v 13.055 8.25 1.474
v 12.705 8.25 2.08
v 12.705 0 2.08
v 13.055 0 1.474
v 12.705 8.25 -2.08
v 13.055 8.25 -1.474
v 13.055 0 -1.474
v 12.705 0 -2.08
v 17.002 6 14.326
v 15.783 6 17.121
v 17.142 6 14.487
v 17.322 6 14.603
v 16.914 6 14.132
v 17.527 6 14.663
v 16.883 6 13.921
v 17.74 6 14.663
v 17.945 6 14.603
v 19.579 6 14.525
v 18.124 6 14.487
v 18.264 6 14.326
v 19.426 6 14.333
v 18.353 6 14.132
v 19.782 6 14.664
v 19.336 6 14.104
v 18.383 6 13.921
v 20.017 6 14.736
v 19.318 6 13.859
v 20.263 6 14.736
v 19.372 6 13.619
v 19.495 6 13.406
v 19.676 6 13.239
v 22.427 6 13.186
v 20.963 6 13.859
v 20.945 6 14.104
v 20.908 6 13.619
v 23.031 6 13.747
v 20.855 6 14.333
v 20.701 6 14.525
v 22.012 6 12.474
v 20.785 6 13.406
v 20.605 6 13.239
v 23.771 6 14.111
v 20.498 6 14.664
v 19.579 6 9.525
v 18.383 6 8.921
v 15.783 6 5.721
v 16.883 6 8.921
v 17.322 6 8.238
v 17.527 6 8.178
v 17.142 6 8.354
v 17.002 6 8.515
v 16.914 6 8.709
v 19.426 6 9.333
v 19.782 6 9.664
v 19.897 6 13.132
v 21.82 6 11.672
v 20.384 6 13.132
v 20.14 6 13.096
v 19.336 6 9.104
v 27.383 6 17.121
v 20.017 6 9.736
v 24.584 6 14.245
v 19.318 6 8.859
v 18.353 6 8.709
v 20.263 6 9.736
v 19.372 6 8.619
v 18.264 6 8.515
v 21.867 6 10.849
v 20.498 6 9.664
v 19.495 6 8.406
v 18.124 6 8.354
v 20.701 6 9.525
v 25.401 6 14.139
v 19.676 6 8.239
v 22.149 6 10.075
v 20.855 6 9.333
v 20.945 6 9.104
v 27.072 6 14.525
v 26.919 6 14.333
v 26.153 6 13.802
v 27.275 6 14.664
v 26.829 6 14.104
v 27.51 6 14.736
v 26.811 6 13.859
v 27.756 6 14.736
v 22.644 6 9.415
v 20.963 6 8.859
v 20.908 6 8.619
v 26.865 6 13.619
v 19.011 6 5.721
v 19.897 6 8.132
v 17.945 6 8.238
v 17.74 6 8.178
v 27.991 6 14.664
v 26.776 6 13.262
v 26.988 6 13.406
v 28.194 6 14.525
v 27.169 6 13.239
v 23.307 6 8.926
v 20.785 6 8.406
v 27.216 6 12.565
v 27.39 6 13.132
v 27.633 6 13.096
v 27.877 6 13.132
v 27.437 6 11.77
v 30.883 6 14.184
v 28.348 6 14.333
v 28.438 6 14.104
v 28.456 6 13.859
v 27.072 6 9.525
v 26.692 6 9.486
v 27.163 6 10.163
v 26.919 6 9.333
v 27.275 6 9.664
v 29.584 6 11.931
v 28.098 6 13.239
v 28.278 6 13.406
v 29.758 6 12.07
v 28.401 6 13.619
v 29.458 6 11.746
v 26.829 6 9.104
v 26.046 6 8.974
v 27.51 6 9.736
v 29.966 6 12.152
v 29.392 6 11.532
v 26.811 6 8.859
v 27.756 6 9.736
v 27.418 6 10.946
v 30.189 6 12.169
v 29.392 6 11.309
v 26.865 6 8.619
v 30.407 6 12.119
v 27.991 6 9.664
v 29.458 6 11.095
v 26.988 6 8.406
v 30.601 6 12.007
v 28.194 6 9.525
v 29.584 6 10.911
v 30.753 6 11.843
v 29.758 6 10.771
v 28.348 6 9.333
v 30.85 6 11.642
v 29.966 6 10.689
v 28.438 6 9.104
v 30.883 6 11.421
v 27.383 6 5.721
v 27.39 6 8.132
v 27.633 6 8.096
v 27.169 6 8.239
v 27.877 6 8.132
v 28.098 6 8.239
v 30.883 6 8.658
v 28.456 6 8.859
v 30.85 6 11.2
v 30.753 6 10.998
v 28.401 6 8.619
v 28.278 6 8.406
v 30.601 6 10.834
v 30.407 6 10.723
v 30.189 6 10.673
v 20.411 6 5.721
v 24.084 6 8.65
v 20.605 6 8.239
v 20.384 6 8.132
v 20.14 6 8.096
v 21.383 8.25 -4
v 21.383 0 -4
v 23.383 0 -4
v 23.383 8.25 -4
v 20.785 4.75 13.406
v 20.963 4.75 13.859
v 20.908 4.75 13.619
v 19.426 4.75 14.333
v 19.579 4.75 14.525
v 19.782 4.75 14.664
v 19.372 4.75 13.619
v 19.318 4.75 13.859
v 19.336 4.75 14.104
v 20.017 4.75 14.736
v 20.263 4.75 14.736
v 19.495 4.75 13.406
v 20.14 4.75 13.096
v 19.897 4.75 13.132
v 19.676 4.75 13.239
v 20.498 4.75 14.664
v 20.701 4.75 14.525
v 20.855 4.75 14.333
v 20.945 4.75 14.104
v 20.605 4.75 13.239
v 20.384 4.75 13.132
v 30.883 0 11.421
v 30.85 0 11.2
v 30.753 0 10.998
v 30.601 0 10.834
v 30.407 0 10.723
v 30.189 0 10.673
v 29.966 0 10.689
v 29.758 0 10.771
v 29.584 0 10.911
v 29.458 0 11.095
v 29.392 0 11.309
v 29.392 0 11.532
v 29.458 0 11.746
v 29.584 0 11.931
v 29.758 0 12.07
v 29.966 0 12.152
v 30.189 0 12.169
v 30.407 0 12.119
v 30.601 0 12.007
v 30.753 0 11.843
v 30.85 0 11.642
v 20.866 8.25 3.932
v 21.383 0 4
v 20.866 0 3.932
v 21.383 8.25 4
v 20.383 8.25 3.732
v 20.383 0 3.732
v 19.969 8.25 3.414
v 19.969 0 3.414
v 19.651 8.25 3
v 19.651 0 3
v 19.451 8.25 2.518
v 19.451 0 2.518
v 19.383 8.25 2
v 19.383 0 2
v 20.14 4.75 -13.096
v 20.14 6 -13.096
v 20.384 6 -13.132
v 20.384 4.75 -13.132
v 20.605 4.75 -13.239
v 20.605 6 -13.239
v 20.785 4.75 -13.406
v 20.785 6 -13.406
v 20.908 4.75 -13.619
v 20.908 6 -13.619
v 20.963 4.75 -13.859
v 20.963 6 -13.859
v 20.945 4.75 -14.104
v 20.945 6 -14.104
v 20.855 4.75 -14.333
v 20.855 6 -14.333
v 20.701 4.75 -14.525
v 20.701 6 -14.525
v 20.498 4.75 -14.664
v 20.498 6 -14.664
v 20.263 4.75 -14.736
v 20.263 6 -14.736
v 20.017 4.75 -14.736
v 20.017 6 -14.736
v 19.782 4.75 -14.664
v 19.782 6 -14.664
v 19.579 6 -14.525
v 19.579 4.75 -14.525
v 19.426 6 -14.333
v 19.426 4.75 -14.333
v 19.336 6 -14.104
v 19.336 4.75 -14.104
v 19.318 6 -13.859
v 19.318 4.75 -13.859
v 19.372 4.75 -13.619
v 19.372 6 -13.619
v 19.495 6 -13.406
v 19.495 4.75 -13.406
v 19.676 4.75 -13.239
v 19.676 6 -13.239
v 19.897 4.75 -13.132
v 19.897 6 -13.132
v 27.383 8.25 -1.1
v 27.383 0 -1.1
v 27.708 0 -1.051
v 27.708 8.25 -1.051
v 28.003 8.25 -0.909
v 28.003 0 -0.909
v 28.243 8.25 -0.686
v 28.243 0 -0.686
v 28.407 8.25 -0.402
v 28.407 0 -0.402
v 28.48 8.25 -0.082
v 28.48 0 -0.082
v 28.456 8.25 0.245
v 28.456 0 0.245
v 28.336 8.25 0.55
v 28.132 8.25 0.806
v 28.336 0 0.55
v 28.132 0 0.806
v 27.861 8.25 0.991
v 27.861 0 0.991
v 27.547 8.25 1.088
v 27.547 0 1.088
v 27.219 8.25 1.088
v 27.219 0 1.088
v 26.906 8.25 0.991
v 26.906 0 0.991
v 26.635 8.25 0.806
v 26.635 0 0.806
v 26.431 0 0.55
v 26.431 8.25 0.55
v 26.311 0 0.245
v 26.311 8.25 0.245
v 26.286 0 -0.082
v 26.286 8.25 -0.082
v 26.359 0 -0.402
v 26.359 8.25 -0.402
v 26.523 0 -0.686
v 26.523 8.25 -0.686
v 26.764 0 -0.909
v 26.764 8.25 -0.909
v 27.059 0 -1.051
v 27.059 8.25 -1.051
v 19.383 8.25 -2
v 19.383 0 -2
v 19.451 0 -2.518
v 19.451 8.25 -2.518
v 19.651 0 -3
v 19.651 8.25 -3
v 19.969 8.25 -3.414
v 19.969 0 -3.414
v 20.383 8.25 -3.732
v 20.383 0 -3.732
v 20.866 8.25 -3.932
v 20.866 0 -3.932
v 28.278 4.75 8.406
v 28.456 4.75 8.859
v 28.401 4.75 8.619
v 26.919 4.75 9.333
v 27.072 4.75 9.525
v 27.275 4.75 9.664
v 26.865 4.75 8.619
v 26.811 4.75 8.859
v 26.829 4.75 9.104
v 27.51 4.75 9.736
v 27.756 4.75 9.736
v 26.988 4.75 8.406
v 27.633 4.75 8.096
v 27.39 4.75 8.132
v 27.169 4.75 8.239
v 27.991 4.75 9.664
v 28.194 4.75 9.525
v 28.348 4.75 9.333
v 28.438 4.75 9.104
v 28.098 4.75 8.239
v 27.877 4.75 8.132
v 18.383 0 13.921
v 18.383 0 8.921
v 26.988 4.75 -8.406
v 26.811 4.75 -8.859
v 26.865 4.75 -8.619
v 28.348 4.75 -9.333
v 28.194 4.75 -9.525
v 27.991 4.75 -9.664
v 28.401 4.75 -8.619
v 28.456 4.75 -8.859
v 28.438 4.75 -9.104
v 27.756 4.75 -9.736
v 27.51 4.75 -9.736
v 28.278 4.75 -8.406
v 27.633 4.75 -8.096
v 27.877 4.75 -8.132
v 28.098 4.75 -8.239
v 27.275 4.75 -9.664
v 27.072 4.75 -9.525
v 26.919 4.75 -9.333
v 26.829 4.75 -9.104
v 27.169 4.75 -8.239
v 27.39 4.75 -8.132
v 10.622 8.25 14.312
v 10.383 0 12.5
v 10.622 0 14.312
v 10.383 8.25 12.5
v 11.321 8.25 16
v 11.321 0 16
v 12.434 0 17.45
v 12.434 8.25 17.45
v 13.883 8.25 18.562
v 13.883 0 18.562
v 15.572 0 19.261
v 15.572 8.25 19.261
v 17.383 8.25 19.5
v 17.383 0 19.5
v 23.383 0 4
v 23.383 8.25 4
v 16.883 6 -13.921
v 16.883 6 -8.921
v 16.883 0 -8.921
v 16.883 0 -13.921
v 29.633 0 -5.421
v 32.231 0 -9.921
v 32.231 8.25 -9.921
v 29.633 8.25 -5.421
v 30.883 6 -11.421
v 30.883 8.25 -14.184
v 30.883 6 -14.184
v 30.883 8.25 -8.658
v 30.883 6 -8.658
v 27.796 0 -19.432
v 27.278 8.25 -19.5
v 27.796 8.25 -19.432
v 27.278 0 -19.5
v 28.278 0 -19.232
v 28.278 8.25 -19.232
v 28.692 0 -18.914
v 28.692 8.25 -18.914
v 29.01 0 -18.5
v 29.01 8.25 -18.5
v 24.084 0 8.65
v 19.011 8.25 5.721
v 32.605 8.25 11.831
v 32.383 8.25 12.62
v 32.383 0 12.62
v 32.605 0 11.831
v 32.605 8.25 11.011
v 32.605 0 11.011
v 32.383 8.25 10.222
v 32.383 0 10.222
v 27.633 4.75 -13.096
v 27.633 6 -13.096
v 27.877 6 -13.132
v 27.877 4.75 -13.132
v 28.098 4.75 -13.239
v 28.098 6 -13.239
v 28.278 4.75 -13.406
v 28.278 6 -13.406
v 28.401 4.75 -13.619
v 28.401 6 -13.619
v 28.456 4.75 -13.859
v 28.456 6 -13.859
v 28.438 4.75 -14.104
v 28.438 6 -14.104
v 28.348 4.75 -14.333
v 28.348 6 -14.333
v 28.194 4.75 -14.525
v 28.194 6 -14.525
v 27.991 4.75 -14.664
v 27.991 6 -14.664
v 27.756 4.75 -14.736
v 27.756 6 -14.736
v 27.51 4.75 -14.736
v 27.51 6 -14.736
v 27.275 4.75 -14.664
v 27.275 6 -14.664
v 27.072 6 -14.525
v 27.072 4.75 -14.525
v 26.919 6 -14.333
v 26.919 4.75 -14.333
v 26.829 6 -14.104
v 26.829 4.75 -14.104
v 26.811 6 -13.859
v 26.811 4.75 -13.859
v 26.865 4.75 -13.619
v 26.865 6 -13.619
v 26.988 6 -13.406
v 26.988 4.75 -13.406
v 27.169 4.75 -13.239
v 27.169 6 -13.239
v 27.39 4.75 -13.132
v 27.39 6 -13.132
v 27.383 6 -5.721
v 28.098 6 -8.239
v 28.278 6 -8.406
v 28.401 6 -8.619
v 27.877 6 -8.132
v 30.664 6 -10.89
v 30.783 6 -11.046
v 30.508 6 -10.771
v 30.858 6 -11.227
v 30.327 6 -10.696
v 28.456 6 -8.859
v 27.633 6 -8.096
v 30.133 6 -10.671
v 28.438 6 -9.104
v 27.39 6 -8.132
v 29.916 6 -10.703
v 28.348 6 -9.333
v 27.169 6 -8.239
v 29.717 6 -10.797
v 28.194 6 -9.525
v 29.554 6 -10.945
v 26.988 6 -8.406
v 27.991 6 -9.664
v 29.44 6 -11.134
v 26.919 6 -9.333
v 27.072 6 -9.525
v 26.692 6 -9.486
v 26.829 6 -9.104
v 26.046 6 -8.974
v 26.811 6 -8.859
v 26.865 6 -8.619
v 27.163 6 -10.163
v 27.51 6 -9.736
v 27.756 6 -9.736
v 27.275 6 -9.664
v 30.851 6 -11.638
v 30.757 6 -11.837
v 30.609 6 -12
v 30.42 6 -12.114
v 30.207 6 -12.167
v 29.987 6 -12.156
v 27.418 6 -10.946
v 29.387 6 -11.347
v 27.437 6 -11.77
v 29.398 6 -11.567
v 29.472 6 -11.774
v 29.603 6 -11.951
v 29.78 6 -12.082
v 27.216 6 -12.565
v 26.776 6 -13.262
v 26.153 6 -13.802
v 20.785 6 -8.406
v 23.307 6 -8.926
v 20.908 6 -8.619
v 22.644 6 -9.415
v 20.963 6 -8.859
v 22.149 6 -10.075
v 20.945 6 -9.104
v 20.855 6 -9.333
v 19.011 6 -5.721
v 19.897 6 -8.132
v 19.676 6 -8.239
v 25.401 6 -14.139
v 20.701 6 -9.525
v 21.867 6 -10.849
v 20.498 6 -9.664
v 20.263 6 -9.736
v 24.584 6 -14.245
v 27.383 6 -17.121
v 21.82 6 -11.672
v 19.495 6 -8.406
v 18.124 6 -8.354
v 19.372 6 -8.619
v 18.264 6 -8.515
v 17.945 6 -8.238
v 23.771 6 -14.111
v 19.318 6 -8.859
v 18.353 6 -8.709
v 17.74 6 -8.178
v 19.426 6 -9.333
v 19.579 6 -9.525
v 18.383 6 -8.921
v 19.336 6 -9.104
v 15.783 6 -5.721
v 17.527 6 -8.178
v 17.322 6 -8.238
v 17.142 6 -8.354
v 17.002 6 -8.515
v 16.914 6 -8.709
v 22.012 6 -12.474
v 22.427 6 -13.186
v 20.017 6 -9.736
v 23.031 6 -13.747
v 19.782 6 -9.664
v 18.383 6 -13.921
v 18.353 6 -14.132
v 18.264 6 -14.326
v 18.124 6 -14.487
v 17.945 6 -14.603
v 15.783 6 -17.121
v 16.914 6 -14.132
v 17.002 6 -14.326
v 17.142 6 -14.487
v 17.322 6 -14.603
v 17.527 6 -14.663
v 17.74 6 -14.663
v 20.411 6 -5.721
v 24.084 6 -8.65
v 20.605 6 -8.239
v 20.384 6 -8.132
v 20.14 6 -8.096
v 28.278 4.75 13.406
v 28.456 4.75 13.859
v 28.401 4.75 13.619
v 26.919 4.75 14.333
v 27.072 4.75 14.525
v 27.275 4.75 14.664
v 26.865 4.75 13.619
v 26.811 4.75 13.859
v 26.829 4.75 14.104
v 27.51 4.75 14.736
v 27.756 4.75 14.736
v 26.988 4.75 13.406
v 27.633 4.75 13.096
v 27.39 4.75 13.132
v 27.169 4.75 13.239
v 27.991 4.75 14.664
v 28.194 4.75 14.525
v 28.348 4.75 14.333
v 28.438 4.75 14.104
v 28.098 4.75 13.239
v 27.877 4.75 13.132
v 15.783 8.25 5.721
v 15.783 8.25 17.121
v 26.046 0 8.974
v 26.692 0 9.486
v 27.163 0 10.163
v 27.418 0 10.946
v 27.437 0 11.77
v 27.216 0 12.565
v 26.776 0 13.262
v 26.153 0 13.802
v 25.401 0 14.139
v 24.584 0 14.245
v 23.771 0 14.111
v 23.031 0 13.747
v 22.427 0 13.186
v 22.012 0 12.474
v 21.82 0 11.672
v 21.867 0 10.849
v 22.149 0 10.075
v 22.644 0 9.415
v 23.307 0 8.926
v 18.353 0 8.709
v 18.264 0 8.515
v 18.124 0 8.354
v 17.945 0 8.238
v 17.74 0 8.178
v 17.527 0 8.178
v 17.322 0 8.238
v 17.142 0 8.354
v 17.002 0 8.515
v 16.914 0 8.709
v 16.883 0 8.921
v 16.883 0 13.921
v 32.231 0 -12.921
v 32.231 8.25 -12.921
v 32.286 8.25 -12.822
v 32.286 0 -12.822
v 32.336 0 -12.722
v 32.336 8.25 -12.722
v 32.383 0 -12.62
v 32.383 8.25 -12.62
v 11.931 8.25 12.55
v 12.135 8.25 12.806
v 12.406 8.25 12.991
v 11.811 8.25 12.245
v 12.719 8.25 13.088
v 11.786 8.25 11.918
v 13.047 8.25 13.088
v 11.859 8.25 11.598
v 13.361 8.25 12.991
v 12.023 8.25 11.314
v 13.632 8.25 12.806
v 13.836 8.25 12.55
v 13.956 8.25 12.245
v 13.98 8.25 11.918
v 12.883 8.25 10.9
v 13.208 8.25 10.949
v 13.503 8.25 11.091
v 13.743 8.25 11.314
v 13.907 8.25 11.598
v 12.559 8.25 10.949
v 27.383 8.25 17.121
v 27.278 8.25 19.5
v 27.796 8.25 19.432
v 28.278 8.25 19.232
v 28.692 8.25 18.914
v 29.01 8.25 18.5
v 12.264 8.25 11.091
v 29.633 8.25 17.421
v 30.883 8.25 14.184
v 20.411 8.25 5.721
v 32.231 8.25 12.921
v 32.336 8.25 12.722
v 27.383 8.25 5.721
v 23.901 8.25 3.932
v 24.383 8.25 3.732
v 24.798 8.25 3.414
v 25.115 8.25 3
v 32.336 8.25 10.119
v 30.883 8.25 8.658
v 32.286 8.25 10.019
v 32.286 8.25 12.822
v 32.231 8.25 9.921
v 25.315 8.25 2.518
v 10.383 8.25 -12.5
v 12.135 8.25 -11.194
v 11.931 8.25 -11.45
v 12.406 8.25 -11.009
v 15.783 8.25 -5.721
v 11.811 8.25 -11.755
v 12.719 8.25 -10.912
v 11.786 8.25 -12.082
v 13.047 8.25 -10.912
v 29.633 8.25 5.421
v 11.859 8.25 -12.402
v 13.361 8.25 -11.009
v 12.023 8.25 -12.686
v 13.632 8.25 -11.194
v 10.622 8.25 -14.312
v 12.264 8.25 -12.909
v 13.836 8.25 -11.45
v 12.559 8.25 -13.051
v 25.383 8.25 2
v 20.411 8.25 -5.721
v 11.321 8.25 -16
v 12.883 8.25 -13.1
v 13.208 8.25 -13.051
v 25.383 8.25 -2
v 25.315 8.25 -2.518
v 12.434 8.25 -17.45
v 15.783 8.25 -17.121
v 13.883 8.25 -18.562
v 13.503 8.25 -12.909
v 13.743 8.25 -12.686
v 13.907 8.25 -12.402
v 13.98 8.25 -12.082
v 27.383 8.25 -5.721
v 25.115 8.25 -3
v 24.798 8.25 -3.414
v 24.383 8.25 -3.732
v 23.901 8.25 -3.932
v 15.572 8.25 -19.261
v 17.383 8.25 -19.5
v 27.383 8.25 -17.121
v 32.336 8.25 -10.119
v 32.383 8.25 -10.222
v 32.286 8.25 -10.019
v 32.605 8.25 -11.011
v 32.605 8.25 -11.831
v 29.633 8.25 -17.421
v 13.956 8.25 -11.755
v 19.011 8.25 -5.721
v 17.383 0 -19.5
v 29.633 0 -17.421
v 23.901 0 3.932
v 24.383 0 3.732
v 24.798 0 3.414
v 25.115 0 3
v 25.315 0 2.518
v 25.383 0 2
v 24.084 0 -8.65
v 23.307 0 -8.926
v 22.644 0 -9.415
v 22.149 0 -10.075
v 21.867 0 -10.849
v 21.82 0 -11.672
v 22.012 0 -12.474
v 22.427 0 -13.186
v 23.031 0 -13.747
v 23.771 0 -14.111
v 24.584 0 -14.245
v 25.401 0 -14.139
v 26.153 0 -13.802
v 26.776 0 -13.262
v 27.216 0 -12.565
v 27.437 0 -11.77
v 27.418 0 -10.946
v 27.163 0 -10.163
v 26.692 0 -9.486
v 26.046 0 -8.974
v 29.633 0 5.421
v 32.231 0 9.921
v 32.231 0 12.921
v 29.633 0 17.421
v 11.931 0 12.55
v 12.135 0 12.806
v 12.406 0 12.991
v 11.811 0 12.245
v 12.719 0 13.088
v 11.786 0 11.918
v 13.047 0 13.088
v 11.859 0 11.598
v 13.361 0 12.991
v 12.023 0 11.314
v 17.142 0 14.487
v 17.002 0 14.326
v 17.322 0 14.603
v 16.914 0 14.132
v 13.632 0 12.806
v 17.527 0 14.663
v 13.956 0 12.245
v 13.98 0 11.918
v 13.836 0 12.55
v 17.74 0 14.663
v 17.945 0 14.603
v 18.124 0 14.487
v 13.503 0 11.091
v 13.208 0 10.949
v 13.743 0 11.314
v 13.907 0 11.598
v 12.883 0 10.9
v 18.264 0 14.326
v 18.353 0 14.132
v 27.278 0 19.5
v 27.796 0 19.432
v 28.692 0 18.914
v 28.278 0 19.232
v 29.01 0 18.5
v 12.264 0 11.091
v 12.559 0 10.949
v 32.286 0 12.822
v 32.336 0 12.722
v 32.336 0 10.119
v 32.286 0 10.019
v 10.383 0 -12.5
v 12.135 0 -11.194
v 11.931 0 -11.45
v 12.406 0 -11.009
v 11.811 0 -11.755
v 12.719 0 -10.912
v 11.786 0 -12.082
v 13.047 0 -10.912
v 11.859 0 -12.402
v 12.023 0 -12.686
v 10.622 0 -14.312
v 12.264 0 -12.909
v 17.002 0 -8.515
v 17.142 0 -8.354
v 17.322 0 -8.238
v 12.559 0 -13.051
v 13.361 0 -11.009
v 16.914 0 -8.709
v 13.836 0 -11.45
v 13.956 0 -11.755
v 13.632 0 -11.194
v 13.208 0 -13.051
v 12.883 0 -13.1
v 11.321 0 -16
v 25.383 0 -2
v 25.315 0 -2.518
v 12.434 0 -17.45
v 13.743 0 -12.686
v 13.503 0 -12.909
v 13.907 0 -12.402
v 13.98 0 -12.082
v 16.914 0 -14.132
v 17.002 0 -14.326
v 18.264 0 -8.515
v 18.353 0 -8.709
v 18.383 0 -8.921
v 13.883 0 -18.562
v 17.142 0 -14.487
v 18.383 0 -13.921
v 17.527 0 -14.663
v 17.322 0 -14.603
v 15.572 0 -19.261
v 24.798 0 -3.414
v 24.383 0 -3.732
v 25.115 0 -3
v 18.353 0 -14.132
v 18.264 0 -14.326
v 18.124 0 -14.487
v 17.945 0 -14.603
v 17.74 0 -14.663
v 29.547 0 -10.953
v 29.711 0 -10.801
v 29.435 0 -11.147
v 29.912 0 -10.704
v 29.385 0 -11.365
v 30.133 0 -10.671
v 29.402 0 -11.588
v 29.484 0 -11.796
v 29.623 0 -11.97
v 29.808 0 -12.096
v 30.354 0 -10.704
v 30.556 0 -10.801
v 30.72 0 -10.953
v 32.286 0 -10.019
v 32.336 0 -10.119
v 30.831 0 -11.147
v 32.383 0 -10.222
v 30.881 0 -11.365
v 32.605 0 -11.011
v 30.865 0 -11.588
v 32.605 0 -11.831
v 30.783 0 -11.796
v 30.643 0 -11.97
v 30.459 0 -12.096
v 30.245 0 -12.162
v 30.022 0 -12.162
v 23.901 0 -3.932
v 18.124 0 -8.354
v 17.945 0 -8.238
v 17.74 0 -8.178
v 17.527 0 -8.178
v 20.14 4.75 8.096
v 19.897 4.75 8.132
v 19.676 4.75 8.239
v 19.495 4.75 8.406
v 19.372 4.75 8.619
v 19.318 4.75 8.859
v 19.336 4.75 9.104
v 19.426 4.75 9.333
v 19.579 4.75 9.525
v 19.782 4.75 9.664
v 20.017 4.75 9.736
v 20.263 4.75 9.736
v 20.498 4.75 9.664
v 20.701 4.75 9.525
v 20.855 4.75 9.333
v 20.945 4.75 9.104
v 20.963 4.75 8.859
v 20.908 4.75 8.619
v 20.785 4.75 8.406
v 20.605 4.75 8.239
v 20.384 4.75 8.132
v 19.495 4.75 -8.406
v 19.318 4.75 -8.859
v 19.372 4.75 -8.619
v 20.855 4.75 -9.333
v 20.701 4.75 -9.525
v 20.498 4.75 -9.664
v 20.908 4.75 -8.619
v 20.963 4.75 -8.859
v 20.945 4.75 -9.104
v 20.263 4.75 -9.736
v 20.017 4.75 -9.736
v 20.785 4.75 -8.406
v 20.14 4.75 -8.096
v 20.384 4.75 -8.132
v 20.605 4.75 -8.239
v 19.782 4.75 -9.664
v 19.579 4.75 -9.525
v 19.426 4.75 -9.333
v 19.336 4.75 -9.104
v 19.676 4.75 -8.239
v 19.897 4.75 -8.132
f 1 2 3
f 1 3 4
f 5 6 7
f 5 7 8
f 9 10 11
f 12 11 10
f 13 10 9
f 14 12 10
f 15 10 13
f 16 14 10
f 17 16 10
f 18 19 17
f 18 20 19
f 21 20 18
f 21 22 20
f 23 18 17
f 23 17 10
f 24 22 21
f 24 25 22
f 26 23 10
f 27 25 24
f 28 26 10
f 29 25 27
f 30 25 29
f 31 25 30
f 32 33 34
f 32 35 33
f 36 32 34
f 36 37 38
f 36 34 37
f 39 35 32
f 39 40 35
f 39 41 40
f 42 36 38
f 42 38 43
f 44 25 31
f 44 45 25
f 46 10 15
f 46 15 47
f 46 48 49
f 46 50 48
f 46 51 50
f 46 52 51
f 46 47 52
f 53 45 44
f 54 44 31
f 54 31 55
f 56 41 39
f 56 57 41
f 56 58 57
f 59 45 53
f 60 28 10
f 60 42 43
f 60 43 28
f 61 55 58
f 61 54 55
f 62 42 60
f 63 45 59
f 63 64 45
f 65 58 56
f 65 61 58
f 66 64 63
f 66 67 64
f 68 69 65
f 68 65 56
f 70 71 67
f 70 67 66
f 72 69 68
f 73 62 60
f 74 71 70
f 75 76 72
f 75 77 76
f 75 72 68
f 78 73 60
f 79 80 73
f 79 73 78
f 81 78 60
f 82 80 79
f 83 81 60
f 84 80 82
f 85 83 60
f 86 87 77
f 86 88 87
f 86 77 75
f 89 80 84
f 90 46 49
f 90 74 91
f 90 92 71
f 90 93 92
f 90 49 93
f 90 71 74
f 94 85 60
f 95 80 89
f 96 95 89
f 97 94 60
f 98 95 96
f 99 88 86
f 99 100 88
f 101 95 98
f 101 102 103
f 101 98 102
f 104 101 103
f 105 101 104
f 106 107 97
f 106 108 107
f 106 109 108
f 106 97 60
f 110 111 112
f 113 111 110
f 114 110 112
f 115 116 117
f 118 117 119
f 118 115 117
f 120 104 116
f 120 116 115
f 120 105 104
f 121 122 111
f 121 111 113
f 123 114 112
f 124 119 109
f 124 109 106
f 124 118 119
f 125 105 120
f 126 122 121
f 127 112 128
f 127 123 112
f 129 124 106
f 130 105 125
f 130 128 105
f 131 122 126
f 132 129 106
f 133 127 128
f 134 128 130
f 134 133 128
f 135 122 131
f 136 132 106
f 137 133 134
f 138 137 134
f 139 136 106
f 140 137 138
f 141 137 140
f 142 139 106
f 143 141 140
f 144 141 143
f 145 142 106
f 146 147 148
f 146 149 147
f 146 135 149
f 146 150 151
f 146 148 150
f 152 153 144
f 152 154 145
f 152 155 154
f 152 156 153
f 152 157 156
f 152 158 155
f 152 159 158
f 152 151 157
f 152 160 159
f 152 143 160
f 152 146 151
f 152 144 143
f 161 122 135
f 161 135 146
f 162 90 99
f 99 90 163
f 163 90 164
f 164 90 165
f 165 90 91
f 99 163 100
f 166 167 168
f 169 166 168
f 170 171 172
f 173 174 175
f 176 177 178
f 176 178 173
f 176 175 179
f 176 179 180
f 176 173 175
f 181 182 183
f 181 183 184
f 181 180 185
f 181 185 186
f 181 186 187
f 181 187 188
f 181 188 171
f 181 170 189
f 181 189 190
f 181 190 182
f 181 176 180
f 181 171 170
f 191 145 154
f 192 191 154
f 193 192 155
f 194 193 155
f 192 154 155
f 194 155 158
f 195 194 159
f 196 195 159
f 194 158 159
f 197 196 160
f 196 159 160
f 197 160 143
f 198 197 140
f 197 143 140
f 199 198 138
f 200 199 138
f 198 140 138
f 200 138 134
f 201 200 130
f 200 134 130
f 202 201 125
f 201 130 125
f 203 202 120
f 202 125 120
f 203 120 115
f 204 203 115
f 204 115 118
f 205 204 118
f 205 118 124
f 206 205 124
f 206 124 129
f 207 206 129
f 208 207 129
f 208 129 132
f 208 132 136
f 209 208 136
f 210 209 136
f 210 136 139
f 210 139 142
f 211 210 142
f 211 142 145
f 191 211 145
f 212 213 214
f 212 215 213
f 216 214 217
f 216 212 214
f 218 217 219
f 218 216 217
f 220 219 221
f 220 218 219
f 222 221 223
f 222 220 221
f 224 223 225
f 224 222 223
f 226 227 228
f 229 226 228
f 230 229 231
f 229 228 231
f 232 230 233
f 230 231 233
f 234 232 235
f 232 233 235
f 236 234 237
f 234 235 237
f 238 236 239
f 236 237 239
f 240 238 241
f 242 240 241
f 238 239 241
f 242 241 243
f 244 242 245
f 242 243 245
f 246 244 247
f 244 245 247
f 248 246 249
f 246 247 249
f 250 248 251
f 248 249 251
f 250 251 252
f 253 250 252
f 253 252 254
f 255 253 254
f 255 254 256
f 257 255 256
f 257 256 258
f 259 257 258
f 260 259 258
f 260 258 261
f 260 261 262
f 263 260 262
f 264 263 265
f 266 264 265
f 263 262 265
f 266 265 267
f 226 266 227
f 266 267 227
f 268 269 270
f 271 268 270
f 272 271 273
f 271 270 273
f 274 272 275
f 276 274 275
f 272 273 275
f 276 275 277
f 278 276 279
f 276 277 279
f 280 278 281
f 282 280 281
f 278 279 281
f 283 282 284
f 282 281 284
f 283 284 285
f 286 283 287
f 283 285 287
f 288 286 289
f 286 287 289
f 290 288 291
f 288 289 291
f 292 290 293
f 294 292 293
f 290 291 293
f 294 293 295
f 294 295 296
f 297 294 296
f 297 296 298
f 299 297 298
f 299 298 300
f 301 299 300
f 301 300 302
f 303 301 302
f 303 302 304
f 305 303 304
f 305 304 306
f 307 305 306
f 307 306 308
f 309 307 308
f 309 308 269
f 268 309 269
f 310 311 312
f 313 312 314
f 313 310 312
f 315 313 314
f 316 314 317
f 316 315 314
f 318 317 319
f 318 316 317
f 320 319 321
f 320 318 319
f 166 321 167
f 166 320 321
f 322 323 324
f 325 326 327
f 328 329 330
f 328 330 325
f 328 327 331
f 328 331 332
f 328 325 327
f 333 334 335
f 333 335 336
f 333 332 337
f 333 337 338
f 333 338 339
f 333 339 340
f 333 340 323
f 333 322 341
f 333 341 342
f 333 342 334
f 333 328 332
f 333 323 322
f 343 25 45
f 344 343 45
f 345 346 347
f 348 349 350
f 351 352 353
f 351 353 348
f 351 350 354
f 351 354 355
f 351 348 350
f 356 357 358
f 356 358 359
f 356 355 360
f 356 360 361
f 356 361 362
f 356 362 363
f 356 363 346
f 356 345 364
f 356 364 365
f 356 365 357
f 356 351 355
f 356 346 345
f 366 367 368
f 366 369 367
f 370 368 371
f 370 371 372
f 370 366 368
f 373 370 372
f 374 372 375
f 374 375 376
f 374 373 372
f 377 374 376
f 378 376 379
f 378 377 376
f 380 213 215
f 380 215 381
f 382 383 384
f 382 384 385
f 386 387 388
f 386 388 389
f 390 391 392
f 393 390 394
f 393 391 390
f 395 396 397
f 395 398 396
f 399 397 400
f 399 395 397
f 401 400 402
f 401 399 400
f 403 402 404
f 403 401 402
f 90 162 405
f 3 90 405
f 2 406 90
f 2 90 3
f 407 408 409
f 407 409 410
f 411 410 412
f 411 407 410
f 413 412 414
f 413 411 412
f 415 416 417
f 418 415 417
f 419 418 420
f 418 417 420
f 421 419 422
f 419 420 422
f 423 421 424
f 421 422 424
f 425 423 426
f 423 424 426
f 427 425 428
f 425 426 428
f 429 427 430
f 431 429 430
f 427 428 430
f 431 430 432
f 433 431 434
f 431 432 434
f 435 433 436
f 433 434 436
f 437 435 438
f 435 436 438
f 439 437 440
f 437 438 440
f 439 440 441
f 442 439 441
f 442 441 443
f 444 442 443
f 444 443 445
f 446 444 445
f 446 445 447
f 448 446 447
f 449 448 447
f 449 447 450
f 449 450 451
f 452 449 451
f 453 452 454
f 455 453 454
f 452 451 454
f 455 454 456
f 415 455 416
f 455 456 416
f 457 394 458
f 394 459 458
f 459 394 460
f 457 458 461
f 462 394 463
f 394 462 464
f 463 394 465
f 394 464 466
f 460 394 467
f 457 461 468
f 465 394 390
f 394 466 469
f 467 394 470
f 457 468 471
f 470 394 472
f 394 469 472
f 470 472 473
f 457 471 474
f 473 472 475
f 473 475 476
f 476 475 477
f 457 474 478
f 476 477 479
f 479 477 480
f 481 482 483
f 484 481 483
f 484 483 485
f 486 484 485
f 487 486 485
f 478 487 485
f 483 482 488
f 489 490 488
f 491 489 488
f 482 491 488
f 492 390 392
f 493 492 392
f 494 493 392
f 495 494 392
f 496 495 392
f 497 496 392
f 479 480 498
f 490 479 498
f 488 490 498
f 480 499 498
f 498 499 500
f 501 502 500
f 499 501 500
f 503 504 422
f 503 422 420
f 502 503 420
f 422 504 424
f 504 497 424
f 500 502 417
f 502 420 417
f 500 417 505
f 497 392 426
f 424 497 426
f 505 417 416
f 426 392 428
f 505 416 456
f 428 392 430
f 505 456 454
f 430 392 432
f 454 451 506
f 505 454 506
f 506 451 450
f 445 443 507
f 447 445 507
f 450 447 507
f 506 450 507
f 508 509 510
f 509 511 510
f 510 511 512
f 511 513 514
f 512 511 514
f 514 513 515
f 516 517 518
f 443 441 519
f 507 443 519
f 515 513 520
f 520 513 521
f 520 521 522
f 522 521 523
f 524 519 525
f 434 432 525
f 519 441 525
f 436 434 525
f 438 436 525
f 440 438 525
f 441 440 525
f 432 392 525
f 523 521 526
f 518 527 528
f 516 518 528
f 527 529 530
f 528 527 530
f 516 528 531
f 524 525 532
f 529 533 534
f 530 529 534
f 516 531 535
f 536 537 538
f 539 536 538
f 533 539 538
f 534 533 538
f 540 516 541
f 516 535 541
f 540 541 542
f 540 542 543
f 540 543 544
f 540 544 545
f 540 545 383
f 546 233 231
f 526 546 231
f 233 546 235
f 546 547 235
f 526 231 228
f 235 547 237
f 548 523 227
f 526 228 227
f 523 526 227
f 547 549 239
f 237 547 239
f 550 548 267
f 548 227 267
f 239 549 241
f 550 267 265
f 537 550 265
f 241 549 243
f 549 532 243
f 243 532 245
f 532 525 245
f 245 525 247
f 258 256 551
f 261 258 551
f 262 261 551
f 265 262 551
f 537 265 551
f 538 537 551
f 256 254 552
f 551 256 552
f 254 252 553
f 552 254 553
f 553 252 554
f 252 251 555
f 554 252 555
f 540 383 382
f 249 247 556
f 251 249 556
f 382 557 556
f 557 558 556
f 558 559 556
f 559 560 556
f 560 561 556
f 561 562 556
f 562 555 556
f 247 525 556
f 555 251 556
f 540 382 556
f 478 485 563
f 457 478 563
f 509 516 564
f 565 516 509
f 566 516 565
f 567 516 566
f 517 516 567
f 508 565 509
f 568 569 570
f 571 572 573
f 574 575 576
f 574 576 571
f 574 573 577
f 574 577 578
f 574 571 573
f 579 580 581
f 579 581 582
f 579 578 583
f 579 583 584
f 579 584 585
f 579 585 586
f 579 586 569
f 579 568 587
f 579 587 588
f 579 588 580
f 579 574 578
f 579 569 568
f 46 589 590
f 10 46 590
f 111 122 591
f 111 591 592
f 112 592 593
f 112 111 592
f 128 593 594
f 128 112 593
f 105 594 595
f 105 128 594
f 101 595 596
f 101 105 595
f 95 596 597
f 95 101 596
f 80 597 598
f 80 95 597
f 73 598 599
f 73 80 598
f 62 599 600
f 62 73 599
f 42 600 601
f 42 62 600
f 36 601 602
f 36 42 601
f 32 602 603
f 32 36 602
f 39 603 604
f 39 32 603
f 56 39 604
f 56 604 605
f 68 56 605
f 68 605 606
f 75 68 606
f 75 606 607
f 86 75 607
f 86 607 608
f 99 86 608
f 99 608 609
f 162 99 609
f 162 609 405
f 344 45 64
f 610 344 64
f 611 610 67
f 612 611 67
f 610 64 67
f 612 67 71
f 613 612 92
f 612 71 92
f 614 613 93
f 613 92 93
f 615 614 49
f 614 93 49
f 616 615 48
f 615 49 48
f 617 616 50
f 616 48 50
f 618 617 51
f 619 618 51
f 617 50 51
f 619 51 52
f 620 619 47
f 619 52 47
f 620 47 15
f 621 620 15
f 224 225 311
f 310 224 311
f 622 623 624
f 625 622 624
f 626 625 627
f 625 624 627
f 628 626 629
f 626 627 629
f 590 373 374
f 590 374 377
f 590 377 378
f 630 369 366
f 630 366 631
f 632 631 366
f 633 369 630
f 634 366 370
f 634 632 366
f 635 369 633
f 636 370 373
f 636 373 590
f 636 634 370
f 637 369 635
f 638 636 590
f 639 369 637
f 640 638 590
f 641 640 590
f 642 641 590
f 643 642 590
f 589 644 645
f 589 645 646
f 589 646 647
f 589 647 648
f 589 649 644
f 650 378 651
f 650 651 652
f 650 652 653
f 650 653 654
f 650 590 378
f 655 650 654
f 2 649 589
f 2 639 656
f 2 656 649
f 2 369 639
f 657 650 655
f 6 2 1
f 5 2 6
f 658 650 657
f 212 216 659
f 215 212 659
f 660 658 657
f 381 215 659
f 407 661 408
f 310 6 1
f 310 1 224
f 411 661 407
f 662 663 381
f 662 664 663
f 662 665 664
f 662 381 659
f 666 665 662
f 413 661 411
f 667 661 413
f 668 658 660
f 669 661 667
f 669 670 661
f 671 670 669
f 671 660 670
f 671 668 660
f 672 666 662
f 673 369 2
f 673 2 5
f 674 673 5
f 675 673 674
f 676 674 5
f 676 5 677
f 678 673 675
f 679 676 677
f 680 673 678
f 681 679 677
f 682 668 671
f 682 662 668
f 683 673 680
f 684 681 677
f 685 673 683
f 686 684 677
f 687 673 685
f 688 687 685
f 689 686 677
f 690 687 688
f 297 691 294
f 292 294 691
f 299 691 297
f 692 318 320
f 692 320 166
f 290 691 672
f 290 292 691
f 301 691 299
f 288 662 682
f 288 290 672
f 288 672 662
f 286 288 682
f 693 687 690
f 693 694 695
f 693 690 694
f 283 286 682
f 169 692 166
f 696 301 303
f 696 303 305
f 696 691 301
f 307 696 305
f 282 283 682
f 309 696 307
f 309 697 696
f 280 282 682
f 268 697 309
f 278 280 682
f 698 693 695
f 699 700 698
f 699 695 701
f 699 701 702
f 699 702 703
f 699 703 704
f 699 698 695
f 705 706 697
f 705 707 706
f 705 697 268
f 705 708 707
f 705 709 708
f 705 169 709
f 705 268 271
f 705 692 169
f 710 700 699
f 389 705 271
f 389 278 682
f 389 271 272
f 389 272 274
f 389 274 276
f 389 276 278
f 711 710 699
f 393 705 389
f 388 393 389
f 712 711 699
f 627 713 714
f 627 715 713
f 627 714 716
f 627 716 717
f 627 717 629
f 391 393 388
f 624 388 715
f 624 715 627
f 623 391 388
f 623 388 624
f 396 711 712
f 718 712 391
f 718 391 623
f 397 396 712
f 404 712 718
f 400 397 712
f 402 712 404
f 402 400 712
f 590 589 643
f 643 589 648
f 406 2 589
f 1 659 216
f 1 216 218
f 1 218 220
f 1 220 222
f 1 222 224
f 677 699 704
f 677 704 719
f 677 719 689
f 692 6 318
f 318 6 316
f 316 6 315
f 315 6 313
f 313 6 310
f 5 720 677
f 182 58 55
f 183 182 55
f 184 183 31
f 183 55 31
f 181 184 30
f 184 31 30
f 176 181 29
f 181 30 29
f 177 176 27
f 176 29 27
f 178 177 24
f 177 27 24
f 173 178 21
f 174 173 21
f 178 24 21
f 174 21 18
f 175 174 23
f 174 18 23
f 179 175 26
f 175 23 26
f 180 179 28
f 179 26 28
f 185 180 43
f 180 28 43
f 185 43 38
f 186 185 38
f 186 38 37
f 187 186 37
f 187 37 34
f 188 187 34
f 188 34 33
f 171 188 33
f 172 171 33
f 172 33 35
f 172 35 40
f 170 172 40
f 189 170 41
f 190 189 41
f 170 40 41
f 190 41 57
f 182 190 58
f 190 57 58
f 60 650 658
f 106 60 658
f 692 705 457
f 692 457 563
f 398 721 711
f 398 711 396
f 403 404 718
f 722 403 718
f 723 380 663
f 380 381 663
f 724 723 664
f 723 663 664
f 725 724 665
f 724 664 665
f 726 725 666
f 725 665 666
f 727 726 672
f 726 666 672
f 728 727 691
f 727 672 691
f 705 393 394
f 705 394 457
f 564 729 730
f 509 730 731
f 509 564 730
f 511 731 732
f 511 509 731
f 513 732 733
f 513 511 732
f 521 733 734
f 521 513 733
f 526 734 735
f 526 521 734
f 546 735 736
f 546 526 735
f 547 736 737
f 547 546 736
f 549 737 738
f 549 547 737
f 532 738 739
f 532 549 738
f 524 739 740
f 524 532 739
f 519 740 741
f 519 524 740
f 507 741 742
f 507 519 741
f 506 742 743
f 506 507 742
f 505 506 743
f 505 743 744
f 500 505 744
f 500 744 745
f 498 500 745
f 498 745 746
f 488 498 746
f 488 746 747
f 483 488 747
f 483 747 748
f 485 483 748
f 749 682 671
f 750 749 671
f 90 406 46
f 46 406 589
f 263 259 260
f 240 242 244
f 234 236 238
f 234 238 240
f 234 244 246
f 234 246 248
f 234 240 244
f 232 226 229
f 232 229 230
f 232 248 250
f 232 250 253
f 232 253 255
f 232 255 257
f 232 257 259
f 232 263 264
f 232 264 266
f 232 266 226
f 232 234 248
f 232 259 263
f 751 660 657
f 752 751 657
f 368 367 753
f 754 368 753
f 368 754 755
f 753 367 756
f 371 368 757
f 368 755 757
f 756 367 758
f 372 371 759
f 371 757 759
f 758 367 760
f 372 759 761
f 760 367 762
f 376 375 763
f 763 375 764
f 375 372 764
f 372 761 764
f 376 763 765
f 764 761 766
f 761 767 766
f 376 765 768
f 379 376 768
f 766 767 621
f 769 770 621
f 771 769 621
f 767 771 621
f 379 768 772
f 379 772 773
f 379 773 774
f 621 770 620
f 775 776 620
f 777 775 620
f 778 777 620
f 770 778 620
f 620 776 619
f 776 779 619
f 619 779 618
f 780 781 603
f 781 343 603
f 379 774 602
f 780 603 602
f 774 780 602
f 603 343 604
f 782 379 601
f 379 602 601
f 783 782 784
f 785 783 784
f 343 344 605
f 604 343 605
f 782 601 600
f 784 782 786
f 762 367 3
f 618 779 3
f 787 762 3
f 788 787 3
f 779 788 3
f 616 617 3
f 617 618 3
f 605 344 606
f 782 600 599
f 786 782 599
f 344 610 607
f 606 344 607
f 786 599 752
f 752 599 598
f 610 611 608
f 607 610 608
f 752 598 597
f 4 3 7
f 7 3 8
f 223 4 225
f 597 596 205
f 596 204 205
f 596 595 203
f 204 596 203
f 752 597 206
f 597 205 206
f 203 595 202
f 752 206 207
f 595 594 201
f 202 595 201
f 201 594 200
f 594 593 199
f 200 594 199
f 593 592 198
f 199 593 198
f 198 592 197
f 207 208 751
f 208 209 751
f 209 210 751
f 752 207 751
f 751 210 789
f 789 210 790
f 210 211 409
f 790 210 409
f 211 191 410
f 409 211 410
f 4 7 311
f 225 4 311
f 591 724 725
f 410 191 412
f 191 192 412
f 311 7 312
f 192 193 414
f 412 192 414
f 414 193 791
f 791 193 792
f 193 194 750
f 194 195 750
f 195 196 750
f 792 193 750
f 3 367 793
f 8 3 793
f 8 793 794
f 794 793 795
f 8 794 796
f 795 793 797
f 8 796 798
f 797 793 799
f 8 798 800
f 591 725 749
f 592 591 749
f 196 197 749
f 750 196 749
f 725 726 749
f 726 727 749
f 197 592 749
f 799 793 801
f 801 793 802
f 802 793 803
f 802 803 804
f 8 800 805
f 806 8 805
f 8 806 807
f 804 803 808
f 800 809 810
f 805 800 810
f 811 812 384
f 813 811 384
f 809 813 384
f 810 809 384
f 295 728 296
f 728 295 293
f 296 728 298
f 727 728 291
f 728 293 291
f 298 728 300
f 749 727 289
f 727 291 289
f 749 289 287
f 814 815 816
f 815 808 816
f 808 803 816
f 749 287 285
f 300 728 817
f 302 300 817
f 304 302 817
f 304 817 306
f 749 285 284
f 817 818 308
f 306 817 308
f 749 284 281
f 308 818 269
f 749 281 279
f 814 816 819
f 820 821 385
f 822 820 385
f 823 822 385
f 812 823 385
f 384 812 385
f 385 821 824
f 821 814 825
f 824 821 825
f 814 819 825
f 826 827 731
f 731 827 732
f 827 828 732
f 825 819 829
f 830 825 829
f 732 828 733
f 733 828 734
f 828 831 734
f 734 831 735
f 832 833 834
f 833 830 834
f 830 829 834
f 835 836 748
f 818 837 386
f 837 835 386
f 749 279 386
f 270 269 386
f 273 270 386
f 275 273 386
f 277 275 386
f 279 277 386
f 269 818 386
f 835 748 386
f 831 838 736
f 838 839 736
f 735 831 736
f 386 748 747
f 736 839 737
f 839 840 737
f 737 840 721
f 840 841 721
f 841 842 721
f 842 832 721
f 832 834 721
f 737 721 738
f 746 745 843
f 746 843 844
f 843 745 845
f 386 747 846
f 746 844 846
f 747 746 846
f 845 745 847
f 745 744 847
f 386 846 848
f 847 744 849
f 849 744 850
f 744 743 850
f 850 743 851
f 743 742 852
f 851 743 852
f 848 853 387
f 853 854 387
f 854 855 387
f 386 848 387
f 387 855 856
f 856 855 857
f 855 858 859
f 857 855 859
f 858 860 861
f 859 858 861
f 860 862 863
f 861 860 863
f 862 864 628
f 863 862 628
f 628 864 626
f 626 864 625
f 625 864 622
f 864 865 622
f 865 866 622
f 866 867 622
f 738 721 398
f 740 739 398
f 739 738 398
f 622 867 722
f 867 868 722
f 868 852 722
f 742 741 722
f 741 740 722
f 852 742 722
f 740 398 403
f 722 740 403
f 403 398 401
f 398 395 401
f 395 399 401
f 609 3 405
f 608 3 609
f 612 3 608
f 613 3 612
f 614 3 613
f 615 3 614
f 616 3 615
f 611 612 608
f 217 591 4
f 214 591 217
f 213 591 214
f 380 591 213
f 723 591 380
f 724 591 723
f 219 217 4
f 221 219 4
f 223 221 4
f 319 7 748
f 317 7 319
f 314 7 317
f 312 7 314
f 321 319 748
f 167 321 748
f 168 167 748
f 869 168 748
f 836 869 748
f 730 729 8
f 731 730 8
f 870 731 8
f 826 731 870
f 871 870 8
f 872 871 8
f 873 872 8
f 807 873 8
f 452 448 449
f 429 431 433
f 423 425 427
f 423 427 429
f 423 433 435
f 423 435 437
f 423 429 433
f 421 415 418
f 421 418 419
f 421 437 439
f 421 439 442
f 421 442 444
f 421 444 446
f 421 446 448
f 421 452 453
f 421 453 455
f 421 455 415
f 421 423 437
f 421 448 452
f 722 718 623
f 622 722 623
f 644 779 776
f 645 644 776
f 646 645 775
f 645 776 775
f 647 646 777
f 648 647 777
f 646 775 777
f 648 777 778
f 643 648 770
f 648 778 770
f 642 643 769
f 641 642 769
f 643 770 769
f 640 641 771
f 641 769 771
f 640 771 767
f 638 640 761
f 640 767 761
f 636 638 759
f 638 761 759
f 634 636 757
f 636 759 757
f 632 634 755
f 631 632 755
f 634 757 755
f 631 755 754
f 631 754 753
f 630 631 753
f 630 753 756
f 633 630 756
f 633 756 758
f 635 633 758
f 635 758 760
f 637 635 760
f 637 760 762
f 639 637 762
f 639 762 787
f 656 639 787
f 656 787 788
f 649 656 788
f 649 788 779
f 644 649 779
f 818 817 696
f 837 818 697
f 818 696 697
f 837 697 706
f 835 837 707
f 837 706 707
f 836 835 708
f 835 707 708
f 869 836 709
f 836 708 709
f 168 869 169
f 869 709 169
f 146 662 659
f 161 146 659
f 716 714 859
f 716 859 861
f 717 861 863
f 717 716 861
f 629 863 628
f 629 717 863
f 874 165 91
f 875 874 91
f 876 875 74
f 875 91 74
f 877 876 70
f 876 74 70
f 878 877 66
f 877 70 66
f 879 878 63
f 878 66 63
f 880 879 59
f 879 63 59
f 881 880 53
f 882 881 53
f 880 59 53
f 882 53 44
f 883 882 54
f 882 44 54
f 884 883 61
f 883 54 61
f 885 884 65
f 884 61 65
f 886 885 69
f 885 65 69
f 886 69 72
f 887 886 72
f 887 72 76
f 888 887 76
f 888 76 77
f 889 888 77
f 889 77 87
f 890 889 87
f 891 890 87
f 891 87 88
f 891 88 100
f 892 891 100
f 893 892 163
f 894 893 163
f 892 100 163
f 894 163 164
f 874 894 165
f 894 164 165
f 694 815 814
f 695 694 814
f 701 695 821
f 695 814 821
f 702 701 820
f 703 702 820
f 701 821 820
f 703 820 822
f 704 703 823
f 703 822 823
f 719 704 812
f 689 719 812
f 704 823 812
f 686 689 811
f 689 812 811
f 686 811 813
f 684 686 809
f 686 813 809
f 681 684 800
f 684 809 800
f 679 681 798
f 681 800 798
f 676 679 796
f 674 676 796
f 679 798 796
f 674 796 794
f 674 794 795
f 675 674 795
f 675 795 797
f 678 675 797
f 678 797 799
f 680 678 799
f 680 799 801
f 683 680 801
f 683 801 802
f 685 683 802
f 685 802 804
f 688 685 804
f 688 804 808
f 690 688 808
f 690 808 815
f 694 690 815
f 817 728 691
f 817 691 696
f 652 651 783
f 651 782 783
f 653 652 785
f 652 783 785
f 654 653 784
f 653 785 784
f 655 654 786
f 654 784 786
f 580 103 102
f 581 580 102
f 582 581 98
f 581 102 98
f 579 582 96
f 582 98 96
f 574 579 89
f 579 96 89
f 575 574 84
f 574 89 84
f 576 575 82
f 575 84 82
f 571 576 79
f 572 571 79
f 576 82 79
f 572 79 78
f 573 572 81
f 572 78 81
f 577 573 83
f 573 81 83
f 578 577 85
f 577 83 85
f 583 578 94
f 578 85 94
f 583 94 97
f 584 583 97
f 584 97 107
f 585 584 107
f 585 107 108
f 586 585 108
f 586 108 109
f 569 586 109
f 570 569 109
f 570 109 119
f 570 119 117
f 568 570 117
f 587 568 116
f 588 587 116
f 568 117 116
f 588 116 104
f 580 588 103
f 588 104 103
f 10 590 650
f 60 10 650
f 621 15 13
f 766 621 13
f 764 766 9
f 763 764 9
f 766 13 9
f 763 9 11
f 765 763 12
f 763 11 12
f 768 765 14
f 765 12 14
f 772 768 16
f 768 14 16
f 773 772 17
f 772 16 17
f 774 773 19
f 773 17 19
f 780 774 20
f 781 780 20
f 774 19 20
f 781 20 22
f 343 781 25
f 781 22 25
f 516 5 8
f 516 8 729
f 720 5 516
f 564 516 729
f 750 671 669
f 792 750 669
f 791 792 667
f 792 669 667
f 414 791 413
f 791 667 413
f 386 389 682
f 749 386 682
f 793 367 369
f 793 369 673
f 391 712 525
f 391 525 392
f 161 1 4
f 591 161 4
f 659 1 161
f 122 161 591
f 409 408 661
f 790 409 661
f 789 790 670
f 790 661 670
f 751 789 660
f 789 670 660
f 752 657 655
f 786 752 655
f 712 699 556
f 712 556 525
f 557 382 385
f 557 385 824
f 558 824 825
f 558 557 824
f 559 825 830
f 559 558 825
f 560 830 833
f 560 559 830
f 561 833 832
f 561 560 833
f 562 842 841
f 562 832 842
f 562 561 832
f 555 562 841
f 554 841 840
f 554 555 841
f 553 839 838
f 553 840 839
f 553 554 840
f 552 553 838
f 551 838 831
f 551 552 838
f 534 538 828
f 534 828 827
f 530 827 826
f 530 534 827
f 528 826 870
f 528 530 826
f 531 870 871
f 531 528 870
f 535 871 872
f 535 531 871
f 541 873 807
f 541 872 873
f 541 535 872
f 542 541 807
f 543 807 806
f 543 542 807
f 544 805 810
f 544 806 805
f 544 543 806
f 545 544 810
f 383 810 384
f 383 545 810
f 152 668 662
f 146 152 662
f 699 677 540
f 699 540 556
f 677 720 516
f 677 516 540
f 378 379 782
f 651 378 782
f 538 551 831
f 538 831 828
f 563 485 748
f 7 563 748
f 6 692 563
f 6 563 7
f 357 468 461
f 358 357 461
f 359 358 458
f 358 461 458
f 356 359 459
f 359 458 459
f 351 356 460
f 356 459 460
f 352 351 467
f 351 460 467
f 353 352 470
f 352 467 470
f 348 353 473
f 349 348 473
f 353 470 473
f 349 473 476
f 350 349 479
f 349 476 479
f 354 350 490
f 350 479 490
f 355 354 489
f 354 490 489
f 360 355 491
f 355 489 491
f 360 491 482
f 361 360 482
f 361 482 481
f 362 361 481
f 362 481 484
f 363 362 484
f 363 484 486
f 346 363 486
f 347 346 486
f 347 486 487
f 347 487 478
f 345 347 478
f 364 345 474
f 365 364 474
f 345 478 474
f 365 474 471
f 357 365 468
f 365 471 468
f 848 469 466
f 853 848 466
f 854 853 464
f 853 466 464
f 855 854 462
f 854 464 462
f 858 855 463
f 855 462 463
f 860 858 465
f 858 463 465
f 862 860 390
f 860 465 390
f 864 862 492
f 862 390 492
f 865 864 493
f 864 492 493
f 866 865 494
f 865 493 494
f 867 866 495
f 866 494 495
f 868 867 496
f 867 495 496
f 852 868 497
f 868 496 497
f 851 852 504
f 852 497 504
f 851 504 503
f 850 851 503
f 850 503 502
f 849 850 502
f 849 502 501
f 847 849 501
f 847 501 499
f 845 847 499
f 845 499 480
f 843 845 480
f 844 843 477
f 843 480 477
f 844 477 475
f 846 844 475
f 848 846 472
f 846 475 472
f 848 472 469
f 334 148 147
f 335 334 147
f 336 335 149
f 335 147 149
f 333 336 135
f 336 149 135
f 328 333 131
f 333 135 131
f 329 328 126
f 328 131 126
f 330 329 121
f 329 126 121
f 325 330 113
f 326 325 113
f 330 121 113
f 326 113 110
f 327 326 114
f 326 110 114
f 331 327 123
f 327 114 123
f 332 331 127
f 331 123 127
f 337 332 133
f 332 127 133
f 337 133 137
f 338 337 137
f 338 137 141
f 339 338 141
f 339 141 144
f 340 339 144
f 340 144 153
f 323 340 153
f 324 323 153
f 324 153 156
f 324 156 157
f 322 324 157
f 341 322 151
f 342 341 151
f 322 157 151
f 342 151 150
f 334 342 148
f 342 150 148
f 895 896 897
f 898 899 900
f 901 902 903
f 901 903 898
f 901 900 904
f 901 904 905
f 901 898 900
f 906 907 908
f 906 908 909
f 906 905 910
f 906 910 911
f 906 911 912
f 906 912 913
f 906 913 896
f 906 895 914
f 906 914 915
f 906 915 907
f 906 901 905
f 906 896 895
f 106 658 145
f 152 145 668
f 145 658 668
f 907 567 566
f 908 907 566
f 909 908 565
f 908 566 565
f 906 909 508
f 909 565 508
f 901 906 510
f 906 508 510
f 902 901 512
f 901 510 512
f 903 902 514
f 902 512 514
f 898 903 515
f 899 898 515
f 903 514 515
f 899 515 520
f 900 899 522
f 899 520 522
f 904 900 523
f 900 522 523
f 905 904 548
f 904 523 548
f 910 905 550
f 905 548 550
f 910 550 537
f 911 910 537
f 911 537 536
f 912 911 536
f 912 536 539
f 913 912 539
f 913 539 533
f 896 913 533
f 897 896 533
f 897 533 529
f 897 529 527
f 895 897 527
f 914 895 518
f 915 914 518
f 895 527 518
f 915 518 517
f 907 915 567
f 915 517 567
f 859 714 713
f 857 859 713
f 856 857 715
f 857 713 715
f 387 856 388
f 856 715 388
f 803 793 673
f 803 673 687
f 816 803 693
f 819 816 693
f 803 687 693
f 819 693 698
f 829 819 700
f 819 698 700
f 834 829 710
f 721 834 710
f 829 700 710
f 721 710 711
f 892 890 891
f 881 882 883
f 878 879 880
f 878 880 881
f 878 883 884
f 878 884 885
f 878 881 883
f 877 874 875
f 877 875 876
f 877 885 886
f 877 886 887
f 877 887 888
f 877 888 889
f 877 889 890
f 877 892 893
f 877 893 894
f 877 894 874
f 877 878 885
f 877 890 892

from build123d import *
from build123d.topology import SkipClean

# Parameters (mm, degrees)
SKETCH1_W                  = 22
SKETCH1_H                  = 39
SKETCH1_W_2                = 6
SKETCH1_H_2                = 8
BOSS_EXTRUDE1_DEPTH        = 8.25
CUT_EXTRUDE3_DEPTH         = 2.25
SKETCH7_R                  = 2.825
SKETCH7_R_2                = 0.825
CUT_EXTRUDE4_DEPTH         = 1.25
SKETCH9_R                  = 0.75
CUT_EXTRUDE5_DEPTH         = 39.274404999
CUT_EXTRUDE1_DEPTH         = 39.690988331
CUT_EXTRUDE1_DEPTH_BACK    = 39.690988331
SKETCH6_R                  = 2.825
BOSS_EXTRUDE2_DEPTH        = 8.25
FILLET4_R                  = 2
CUT_EXTRUDE7_DEPTH         = 39.900472274
FILLET5_R                  = 7
F_2_2_2_2_DIAMETER_HOLE1_D = 2.2
FILLET6_R                  = 2


with BuildPart() as part:
    # Sketch1 → Boss-Extrude1 (new body)
    with BuildSketch(Plane(origin=(0, 0, 0), x_dir=(1, 0, 0), z_dir=(0, 1, 0))):
        with Locations((21.383330249, 0)):
            Rectangle(SKETCH1_W, SKETCH1_H)
        with Locations((22.383330249, 0)):
            Rectangle(SKETCH1_W_2, SKETCH1_H_2, mode=Mode.SUBTRACT)
    extrude(amount=BOSS_EXTRUDE1_DEPTH)

    # Sketch8 → Cut-Extrude3 (cut)
    with BuildSketch(Plane(origin=(0, 8.25, 0), x_dir=(1, 0, 0), z_dir=(0, 1, 0))):
        Polygon((15.783330249, 17.120672783), (27.383330249, 17.120672783), (30.883330249, 14.183824074), (30.883330249, 8.657521492), (27.383330249, 5.720672783), (15.783330249, 5.720672783), align=None)
        Polygon((27.383330249, -17.120672783), (30.883330249, -14.183824074), (30.883330249, -8.657521492), (27.383330249, -5.720672783), (15.783330249, -5.720672783), (15.783330249, -17.120672783), align=None)
    extrude(amount=-CUT_EXTRUDE3_DEPTH, mode=Mode.SUBTRACT)

    # Sketch7 → Cut-Extrude4 (cut)
    with BuildSketch(Plane(origin=(0, 6, 0), x_dir=(1, 0, 0), z_dir=(0, 1, 0))):
        with Locations(Location((24.633330249, 11.420672783, 0), (0, 0, 270))):
            Circle(SKETCH7_R)
        with Locations(Location((20.140330249, 13.920672783, 0), (0, 0, 270))):
            Circle(SKETCH7_R_2)
        with Locations(Location((27.633330249, 13.920672783, 0), (0, 0, 270))):
            Circle(SKETCH7_R_2)
        with Locations(Location((27.633330249, 8.920672783, 0), (0, 0, 270))):
            Circle(SKETCH7_R_2)
        with Locations(Location((20.140330249, 8.920672783, 0), (0, 0, 270))):
            Circle(SKETCH7_R_2)
        with Locations(Location((20.140330249, -8.920672783, 0), (0, 0, 90))):
            Circle(SKETCH7_R_2)
        with Locations(Location((27.633330249, -8.920672783, 0), (0, 0, 90))):
            Circle(SKETCH7_R_2)
        with Locations(Location((27.633330249, -13.920672783, 0), (0, 0, 90))):
            Circle(SKETCH7_R_2)
        with Locations(Location((20.140330249, -13.920672783, 0), (0, 0, 90))):
            Circle(SKETCH7_R_2)
        with Locations(Location((24.633330249, -11.420672783, 0), (0, 0, 90))):
            Circle(SKETCH7_R)
    extrude(amount=-CUT_EXTRUDE4_DEPTH, mode=Mode.SUBTRACT)

    # Sketch9 → Cut-Extrude5 (cut, through all)
    with BuildSketch(Plane(origin=(0, 6, 0), x_dir=(1, 0, 0), z_dir=(0, 1, 0))):
        with Locations(Location((30.133330249, 11.420672783, 0), (0, 0, 270))):
            Circle(SKETCH9_R)
        with Locations((30.133330249, -11.420672783)):
            Circle(SKETCH9_R)
        with BuildLine():
            Line((16.883330249, 8.920672783), (16.883330249, 13.920672783))
            ThreePointArc((16.883330249, 13.920672783), (17.633330249, 14.670672783), (18.383330249, 13.920672783))
            Line((18.383330249, 13.920672783), (18.383330249, 8.920672783))
            ThreePointArc((18.383330249, 8.920672783), (17.633330249, 8.170672783), (16.883330249, 8.920672783))
        make_face()
        with BuildLine():
            Line((16.883330249, -8.920672783), (16.883330249, -13.920672783))
            ThreePointArc((16.883330249, -13.920672783), (17.633330249, -14.670672783), (18.383330249, -13.920672783))
            Line((18.383330249, -13.920672783), (18.383330249, -8.920672783))
            ThreePointArc((18.383330249, -8.920672783), (17.633330249, -8.170672783), (16.883330249, -8.920672783))
        make_face()
    extrude(amount=-CUT_EXTRUDE5_DEPTH, mode=Mode.SUBTRACT)

    # Sketch6 → Cut-Extrude1 (cut, two sides: drawn at the far end of the back side and taken through both)
    with BuildSketch(Plane(origin=(0, 8.25, 0), x_dir=(-1, 0, 0), z_dir=(0, -1, 0)).offset(-CUT_EXTRUDE1_DEPTH_BACK)):
        with Locations((-24.633330249, -11.420672783)):
            Circle(SKETCH6_R)
        with Locations((-24.633330249, 11.420672783)):
            Circle(SKETCH6_R)
        Polygon((-26.045830249, -8.974151017), (-25.695830249, -9.5803688), (-12.705449192, -2.0803688), (-13.055449192, -1.474151017), align=None)
        Polygon((-13.055449192, 1.474151017), (-12.705449192, 2.0803688), (-25.695830249, 9.5803688), (-26.045830249, 8.974151017), align=None)
    extrude(amount=CUT_EXTRUDE1_DEPTH + CUT_EXTRUDE1_DEPTH_BACK, mode=Mode.SUBTRACT)

    # Sketch11 → Boss-Extrude2 (add, through all)
    with BuildSketch(Plane(origin=(0, 8.25, 0), x_dir=(1, 0, 0), z_dir=(0, 1, 0))):
        with BuildLine():
            ThreePointArc((32.383330249, 10.221714902), (32.633330249, 11.420672783), (32.383330249, 12.619630664))
            Line((32.383330249, 12.619630664), (32.383330249, 10.221714902))
        make_face()
        with BuildLine():
            ThreePointArc((32.383330249, -12.619630664), (32.633330249, -11.420672783), (32.383330249, -10.221714902))
            Line((32.383330249, -10.221714902), (32.383330249, -12.619630664))
        make_face()
    extrude(amount=-BOSS_EXTRUDE2_DEPTH)

    # Fillet4
    fillet4_edges = [part.edges().sort_by_distance(p)[0] for p in [
        (25.383330249, 4.125, -4),
        (19.383330249, 4.125, -4),
        (19.383330249, 4.125, 4),
        (25.383330249, 4.125, 4),
    ]]
    fillet(fillet4_edges, radius=FILLET4_R)

    # Sketch11<4> → Cut-Extrude7 (cut, through all)
    with SkipClean():  # the faces are left unmerged after this step: merging them gives an invalid solid
        with BuildSketch(Plane(origin=(0, 8.25, 0), x_dir=(1, 0, 0), z_dir=(0, 1, 0))):
            with BuildLine():
                Line((29.633330249, 17.420672783), (32.231406461, 12.920672783))
                ThreePointArc((32.231406461, 12.920672783), (32.311601404, 12.772287972), (32.383330249, 12.619630664))
                Line((32.383330249, 12.619630664), (32.383330249, 19.5))
                Line((32.383330249, 19.5), (28.432830121, 19.5))
                Line((28.432830121, 19.5), (29.633330249, 17.420672783))
            make_face()
            with BuildLine():
                Line((32.383330249, -10.221714902), (32.383330249, 10.221714902))
                ThreePointArc((32.383330249, 10.221714902), (32.311601404, 10.069057593), (32.231406461, 9.920672783))
                Line((32.231406461, 9.920672783), (29.633330249, 5.420672783))
                Line((29.633330249, 5.420672783), (29.633330249, -5.420672783))
                Line((29.633330249, -5.420672783), (32.231406461, -9.920672783))
                ThreePointArc((32.231406461, -9.920672783), (32.311601404, -10.069057593), (32.383330249, -10.221714902))
            make_face()
            with BuildLine():
                Line((32.383330249, -19.5), (32.383330249, -12.619630664))
                ThreePointArc((32.383330249, -12.619630664), (32.311601404, -12.772287972), (32.231406461, -12.920672783))
                Line((32.231406461, -12.920672783), (29.633330249, -17.420672783))
                Line((29.633330249, -17.420672783), (28.432830121, -19.5))
                Line((28.432830121, -19.5), (32.383330249, -19.5))
            make_face()
        extrude(amount=-CUT_EXTRUDE7_DEPTH, mode=Mode.SUBTRACT)

    # Fillet5
    fillet5_edges = [part.edges().sort_by_distance(p)[0] for p in [
        (10.383330249, 4.125, 19.5),
        (10.383330249, 4.125, -19.5),
    ]]
    fillet(fillet5_edges, radius=FILLET5_R)

    # Ø2.2 (2.2) Diameter Hole1 (through all)
    with Locations(Plane(origin=(12.883330249, 8.25, -12), x_dir=(0, 0, 1), z_dir=(0, 1, 0))):
        with Locations((0, 0), (12, 14.5), (24, 0)):
            Hole(F_2_2_2_2_DIAMETER_HOLE1_D / 2)

    # Fillet6
    fillet6_edges = [part.edges().sort_by_distance(p)[0] for p in [
        (28.432830121, 4.125, -19.5),
        (28.432830121, 4.125, 19.5),
    ]]
    fillet(fillet6_edges, radius=FILLET6_R)


solid = part.part
